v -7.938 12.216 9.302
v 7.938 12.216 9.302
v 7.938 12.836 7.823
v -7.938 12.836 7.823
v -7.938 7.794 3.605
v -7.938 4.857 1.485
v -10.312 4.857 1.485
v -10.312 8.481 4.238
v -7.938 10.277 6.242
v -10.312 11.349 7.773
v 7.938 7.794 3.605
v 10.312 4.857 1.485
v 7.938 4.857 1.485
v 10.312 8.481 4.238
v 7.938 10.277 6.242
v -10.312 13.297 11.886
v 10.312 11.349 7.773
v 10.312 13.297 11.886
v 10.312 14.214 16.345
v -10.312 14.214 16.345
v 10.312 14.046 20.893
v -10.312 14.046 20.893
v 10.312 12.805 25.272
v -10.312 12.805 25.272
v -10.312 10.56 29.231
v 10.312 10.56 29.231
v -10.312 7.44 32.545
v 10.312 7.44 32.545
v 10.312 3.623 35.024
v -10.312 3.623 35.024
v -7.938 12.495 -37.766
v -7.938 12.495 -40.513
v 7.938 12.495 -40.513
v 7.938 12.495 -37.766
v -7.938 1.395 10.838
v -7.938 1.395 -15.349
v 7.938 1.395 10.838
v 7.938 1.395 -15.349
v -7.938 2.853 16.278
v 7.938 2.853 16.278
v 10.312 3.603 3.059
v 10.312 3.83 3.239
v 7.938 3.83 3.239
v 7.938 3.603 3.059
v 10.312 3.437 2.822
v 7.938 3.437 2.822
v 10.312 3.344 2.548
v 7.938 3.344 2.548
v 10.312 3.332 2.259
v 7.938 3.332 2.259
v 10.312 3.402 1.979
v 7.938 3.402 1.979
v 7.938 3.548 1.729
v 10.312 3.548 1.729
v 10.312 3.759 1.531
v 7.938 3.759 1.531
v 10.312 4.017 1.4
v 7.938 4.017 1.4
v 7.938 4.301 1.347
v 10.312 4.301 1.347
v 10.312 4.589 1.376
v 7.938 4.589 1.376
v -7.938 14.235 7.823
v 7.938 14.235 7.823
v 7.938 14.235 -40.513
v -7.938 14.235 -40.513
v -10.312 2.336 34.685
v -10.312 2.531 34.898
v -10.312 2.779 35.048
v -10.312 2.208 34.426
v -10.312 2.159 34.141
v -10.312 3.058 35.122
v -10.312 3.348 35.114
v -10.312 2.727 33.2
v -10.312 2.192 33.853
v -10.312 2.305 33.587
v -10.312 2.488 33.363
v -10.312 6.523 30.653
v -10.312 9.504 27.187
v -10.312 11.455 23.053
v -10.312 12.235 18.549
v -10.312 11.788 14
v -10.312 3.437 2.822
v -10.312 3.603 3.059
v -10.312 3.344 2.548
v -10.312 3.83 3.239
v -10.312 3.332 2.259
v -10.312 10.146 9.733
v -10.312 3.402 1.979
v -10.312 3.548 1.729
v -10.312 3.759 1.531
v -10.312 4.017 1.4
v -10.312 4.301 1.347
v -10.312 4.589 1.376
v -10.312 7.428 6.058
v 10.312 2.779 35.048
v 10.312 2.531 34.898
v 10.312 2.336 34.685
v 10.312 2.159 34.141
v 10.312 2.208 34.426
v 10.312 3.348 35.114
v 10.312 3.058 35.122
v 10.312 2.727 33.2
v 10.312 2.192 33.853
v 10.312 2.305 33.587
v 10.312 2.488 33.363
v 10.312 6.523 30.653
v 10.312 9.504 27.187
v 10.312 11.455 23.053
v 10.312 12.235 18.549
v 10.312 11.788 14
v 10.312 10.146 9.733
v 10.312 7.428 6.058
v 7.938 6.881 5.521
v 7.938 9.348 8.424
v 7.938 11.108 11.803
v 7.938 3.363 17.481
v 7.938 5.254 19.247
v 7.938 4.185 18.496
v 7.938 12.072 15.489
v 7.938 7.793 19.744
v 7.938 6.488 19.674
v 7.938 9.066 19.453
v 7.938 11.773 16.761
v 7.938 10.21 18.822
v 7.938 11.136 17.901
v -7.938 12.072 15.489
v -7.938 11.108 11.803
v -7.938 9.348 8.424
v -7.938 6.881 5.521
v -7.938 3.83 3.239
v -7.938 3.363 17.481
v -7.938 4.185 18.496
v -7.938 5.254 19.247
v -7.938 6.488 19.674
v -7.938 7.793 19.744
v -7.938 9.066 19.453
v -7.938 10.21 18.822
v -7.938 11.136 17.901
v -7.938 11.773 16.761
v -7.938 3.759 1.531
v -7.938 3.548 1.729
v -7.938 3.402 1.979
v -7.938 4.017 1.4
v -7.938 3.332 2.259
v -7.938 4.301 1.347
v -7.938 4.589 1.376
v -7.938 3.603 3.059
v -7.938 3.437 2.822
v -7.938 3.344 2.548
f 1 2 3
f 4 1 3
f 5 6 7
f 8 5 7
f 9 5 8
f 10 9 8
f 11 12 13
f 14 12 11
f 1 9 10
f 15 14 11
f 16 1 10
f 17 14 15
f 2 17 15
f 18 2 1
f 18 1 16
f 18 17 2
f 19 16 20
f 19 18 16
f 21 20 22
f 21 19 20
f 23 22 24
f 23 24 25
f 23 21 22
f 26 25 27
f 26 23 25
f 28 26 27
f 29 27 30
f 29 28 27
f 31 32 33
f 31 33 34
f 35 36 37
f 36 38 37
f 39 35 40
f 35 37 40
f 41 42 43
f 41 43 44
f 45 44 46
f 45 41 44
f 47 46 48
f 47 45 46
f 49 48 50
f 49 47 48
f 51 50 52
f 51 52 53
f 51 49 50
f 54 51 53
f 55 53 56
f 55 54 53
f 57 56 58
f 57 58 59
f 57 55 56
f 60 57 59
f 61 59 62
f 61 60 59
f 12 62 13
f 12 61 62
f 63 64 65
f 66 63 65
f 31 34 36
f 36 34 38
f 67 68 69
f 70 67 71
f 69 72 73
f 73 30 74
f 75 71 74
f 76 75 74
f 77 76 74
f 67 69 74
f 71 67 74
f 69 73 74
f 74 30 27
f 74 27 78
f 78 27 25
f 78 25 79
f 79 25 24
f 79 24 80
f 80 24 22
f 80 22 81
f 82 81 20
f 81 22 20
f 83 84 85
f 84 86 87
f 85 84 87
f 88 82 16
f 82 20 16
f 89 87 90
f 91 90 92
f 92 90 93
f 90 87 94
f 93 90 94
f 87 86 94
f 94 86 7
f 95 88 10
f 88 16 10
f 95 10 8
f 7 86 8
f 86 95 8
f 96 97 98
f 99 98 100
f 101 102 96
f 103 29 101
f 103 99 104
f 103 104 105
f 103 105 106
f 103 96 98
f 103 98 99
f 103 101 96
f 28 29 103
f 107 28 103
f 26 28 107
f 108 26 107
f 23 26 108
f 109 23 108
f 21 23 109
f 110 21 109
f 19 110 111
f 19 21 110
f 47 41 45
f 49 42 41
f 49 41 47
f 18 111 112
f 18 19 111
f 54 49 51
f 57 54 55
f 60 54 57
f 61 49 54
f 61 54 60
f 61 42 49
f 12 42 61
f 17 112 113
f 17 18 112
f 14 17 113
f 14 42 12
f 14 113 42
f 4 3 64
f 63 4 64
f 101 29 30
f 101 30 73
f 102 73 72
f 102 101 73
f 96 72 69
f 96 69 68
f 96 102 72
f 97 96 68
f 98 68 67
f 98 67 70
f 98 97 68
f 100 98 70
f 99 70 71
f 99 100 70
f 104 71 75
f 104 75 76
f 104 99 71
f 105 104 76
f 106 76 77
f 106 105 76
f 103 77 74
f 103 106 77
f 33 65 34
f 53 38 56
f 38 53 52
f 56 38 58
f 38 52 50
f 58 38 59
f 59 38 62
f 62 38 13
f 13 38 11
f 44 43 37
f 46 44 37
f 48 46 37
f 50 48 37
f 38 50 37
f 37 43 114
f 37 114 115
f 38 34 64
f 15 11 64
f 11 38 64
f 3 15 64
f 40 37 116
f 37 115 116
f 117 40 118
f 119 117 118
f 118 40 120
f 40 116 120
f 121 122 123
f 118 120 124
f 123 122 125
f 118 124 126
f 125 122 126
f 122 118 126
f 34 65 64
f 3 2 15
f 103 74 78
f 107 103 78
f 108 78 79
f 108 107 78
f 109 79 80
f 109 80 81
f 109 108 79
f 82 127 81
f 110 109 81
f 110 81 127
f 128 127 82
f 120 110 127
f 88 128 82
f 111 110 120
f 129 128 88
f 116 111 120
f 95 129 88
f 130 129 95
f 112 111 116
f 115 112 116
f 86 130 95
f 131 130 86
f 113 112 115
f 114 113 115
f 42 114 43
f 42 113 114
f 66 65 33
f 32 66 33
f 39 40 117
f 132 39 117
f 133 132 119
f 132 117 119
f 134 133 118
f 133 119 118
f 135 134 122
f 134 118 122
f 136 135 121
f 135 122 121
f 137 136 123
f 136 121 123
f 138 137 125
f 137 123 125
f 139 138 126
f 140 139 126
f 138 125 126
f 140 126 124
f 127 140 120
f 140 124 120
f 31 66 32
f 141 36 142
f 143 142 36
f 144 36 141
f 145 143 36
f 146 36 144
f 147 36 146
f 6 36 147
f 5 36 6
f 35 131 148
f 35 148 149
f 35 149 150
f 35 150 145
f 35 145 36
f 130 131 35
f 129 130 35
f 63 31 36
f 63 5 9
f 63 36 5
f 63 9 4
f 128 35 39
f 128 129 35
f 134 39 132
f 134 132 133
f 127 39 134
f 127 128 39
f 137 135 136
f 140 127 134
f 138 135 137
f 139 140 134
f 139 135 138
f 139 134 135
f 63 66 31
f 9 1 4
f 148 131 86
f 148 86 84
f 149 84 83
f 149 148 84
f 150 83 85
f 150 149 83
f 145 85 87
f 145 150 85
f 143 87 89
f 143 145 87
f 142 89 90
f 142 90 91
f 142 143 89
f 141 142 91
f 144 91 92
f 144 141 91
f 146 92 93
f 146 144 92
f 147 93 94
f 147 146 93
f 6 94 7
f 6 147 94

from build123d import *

# Parameters (mm, degrees)
BOSS_EXTRUDE1_DEPTH = 7.9375
BOSS_EXTRUDE2_DEPTH = 10.3124


with BuildPart() as part:
    # Sketch3 → Boss-Extrude1 (new, symmetric)
    with BuildSketch(Plane(origin=(0, 0, 0), x_dir=(0, 0, -1), z_dir=(1, 0, 0))):
        with BuildLine():
            Line((40.513, 14.235338715), (40.513, 12.495229879))
            Line((40.513, 12.495229879), (37.766212018, 12.495229879))
            Line((37.766212018, 12.495229879), (15.349467418, 1.395404479))
            Line((15.349467418, 1.395404479), (-10.837881782, 1.395404479))
            Line((-10.837881782, 1.395404479), (-16.27838917, 2.853173638))
            ThreePointArc((-16.27838917, 2.853173638), (-19.721025133, 8.005427537), (-15.0622, 12.0911112))
            Line((-15.0622, 12.0911112), (-9.601272901, 12.0911112))
            Line((-9.601272901, 12.0911112), (-7.8233016, 12.835531808))
            Line((-7.8233016, 12.835531808), (-7.8233016, 14.235338715))
            Line((-7.8233016, 14.235338715), (40.513, 14.235338715))
        make_face()
    extrude(amount=BOSS_EXTRUDE1_DEPTH, both=True)

    # Sketch4 → Boss-Extrude2 (add, symmetric)
    with BuildSketch(Plane(origin=(0, 0, 0), x_dir=(0, 0, -1), z_dir=(1, 0, 0))):
        with BuildLine():
            ThreePointArc((-3.239093433, 3.82959498), (-1.848605226, 3.466296321), (-1.485306567, 4.856784528))
            ThreePointArc((-1.485306567, 4.856784528), (-18.623790881, 14.266172543), (-35.024465128, 3.622765587))
            ThreePointArc((-35.024465128, 3.622765587), (-34.559965587, 2.262734872), (-33.199934872, 2.727234413))
            ThreePointArc((-33.199934872, 2.727234413), (-18.549060441, 12.235088571), (-3.239093433, 3.82959498))
        make_face()
    extrude(amount=BOSS_EXTRUDE2_DEPTH, both=True)


solid = part.part
